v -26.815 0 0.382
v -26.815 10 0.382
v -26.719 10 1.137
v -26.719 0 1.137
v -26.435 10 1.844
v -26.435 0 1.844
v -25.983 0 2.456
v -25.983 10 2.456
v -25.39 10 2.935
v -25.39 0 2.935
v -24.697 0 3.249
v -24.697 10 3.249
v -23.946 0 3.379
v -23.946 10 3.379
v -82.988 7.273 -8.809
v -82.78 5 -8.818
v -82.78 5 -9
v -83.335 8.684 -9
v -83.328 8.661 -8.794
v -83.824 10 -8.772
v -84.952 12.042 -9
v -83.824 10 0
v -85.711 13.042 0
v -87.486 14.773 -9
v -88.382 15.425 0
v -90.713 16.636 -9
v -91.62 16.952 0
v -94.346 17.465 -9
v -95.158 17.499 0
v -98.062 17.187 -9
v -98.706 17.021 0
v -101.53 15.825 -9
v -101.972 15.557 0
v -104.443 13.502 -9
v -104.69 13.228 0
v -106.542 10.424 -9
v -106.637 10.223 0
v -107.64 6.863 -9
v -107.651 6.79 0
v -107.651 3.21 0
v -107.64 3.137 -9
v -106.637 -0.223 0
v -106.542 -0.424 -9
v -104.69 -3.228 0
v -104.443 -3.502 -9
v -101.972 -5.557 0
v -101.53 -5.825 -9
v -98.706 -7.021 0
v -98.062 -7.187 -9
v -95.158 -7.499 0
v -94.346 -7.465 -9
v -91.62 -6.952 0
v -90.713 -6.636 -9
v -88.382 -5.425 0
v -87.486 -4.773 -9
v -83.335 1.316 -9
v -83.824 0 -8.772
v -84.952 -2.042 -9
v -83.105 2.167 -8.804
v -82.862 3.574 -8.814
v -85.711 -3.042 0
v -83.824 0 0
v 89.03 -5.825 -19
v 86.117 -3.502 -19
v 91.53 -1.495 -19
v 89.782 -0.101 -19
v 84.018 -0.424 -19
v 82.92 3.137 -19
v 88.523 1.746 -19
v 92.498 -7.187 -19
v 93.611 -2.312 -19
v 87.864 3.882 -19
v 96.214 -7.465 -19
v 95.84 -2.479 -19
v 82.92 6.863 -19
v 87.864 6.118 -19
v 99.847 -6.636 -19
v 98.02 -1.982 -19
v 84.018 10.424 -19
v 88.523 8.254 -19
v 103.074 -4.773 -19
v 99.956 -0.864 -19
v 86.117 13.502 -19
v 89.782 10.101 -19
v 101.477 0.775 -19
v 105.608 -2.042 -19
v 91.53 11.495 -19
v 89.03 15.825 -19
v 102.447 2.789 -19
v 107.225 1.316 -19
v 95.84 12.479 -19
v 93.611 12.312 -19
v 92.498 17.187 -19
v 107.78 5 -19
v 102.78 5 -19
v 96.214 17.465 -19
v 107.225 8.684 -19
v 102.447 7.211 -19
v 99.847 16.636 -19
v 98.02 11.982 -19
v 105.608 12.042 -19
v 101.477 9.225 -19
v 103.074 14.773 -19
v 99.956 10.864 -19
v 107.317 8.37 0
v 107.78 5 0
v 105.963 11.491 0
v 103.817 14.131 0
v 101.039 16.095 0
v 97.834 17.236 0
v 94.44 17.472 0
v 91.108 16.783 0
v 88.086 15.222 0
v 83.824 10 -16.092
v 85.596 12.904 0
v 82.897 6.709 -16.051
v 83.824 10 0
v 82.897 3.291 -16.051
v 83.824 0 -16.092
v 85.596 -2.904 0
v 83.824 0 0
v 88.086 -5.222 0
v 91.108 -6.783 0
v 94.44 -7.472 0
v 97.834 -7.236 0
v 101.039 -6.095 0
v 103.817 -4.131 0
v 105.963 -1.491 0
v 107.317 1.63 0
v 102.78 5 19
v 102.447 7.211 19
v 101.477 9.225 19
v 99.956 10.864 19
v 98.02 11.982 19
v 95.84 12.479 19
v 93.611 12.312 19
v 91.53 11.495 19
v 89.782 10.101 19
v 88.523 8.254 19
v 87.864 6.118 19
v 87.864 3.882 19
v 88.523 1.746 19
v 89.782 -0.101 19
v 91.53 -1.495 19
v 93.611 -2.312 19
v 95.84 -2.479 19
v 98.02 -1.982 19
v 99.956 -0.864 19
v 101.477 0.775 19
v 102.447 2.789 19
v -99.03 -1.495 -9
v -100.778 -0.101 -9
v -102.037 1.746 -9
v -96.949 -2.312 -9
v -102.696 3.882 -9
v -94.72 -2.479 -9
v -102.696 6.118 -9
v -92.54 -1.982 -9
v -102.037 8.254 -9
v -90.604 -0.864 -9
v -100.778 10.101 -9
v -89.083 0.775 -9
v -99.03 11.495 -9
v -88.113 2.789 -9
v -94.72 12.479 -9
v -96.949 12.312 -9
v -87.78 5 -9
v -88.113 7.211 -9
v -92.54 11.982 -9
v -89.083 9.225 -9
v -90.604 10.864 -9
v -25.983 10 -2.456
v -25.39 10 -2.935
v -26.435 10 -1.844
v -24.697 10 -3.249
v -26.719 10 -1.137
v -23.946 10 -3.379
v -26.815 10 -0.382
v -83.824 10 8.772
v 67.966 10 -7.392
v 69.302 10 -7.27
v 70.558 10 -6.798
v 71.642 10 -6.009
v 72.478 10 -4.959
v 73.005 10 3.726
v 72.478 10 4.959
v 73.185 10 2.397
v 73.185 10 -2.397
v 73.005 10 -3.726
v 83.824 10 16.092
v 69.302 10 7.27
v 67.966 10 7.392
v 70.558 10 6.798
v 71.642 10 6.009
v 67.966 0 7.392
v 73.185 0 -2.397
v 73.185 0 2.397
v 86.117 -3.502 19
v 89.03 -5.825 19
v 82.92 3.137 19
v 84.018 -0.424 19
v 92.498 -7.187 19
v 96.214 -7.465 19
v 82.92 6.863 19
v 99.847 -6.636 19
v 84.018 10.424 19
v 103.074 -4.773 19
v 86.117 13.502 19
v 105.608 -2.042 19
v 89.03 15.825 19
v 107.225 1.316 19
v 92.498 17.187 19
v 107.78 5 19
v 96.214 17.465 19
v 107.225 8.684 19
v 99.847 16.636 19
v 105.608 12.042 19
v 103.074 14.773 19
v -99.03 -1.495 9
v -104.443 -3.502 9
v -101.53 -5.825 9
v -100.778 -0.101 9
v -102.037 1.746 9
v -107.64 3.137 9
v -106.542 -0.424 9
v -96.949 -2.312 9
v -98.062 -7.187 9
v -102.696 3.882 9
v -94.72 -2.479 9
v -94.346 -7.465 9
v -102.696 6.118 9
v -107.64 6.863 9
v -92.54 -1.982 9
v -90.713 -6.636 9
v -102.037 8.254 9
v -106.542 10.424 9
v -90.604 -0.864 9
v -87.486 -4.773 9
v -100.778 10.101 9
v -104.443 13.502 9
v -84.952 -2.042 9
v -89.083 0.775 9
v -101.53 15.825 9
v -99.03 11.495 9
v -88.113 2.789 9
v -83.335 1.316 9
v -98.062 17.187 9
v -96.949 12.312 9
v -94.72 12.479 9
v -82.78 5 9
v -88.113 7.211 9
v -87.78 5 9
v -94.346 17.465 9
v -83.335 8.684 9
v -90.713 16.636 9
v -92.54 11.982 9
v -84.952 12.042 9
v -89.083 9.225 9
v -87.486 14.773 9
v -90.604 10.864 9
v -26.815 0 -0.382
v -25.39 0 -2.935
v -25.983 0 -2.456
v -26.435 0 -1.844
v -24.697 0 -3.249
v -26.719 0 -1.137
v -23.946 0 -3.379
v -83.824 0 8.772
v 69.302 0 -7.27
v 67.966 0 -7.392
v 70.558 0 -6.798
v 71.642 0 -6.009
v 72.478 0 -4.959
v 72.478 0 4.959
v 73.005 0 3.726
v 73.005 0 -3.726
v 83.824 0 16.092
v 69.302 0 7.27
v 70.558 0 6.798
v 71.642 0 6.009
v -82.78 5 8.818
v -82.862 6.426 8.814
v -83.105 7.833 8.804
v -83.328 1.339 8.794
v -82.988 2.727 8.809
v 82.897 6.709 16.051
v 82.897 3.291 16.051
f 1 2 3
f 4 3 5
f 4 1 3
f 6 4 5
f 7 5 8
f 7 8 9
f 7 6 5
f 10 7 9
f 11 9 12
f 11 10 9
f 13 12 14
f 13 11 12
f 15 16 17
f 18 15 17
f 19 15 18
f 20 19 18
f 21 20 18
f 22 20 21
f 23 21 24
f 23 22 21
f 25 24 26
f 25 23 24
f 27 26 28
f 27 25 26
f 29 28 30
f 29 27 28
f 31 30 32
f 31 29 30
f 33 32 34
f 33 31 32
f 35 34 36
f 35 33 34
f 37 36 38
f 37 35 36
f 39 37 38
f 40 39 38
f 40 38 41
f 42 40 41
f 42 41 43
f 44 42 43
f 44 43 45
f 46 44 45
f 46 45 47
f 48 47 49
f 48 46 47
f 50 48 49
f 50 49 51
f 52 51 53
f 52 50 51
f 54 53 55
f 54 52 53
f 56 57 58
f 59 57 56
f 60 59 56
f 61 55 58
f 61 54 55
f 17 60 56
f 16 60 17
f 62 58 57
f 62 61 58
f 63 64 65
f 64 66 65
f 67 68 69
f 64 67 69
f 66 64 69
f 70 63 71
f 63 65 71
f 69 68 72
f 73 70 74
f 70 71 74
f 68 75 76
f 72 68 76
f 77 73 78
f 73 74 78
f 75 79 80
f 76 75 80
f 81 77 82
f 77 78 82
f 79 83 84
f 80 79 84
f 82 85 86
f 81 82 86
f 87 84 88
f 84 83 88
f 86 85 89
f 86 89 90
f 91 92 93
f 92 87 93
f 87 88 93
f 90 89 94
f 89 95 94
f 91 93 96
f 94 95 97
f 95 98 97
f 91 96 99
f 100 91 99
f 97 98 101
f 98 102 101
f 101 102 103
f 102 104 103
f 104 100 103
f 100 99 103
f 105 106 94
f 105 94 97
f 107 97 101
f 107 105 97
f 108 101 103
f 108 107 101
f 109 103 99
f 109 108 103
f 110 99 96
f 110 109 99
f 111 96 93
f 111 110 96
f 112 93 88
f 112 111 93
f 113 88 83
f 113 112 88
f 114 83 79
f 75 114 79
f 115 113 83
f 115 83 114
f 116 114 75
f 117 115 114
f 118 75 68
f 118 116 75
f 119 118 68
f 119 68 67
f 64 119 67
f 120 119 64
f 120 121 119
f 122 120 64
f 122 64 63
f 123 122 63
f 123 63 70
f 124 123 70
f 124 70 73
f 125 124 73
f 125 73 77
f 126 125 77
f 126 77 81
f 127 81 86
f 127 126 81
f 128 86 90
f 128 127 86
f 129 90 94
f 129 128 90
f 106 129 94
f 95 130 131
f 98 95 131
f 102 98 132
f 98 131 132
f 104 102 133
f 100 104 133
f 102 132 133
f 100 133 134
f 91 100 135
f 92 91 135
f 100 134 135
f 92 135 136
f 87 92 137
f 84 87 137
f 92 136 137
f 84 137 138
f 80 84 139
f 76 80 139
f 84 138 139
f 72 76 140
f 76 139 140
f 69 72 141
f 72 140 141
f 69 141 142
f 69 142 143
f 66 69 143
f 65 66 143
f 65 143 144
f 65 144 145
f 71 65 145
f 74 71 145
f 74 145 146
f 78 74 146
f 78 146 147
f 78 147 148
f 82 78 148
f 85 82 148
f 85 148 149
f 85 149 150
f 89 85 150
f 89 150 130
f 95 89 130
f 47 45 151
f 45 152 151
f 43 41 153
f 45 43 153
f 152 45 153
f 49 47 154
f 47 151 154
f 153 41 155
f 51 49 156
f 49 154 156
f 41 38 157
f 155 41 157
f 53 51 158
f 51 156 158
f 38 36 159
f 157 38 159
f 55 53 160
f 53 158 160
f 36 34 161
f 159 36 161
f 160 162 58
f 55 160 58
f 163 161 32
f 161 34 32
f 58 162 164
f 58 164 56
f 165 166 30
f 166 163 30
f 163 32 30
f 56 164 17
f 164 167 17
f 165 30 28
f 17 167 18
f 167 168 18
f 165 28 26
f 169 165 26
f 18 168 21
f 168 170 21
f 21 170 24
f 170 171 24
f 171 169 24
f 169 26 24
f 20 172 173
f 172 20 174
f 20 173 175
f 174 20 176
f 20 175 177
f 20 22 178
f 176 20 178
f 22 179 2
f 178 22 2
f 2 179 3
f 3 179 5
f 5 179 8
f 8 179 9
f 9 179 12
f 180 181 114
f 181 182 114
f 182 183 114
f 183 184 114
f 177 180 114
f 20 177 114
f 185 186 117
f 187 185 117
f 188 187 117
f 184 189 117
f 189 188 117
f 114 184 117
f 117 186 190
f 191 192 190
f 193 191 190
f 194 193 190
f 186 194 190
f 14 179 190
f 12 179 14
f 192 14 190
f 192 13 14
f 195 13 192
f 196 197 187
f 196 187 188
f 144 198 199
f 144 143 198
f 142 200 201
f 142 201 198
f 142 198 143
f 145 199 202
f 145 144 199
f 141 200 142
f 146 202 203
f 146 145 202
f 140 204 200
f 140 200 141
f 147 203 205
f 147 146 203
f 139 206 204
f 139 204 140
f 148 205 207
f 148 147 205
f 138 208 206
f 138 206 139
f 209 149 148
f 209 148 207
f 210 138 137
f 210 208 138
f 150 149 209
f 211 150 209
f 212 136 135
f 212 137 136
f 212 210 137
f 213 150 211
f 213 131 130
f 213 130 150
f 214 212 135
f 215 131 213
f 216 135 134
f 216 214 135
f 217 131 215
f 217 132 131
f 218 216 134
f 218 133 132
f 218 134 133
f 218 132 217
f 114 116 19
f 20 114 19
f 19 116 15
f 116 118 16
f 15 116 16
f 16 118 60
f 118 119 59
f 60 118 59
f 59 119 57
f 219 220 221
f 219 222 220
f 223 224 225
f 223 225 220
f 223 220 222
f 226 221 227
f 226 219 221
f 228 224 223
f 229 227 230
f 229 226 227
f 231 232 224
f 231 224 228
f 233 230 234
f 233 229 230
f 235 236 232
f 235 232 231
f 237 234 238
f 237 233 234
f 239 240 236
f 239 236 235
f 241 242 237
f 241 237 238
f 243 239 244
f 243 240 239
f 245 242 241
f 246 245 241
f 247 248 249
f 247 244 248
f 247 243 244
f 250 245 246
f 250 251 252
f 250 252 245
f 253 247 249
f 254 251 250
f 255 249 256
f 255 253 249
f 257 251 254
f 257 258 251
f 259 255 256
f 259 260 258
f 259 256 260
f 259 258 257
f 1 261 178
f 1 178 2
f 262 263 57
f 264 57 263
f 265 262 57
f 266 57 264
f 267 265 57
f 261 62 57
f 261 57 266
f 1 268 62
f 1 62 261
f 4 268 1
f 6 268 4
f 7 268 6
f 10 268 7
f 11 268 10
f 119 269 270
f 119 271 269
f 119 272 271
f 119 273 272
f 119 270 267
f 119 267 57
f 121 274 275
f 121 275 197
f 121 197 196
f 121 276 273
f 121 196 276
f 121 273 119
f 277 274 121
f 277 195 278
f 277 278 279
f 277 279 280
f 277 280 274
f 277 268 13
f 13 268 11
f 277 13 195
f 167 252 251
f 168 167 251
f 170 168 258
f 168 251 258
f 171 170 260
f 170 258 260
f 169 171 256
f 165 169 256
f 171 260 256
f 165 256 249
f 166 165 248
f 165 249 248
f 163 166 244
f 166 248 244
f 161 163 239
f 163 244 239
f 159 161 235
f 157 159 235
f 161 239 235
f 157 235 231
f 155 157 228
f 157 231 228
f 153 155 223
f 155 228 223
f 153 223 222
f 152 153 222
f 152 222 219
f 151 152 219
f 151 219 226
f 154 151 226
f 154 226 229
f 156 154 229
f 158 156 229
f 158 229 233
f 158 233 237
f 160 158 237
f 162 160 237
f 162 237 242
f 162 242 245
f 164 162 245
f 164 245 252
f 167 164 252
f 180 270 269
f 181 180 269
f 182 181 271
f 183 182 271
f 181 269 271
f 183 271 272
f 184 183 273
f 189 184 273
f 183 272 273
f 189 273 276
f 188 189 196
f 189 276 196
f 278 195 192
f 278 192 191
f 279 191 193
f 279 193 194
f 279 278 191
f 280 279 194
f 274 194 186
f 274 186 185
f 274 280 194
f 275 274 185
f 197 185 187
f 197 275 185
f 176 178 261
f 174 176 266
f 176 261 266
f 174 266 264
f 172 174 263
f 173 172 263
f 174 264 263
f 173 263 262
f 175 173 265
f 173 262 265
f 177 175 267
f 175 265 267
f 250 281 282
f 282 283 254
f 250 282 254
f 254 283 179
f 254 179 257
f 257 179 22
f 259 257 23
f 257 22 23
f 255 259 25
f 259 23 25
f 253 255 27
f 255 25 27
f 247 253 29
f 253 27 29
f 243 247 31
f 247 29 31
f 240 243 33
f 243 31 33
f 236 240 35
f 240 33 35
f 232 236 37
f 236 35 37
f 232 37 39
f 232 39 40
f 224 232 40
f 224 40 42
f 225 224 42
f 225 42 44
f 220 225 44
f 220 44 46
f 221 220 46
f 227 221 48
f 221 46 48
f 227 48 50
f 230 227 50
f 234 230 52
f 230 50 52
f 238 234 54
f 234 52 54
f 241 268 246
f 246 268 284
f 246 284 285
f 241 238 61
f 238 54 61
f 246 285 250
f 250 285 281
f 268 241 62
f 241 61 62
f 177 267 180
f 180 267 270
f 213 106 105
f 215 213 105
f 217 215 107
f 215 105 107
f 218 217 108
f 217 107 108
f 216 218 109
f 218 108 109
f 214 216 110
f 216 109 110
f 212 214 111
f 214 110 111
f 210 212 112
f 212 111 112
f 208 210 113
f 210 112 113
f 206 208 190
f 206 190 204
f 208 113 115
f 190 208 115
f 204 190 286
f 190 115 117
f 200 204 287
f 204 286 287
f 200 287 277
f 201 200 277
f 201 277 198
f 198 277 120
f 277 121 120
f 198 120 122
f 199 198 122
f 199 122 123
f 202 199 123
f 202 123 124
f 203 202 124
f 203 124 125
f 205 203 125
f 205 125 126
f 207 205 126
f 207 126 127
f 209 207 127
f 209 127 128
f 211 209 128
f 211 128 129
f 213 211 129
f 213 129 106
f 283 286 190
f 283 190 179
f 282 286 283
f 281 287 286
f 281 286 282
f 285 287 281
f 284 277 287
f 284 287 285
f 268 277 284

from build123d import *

# Parameters (mm, degrees)
BOSS_EXTRUDE1_DEPTH      = 10
BOSS_EXTRUDE2_DEPTH      = 9
BOSS_EXTRUDE2_DEPTH_BACK = 9
SKETCH2_R                = 12.5
SKETCH3_R                = 7.5
CUT_EXTRUDE1_DEPTH       = 113.046768917
BOSS_EXTRUDE3_DEPTH      = 19
BOSS_EXTRUDE3_DEPTH_BACK = 19
SKETCH4_R                = 12.5
SKETCH5_R                = 7.5
CUT_EXTRUDE2_DEPTH       = 116.614784522


with BuildPart() as part:
    # Sketch1 → Boss-Extrude1 (new body)
    with BuildSketch(Plane(origin=(0, 0, 0), x_dir=(1, 0, 0), z_dir=(0, 1, 0))):
        with BuildLine():
            Line((84.78, 16.133643284), (-84.78, 8.730493804))
            Line((-84.78, 8.730493804), (-84.78, 0))
            Line((-84.78, 0), (-26.81549416, 0))
            Line((-26.81549416, 0), (-26.81549416, 0.381782076))
            ThreePointArc((-26.81549416, 0.381782076), (-25.982586046, 2.456321244), (-23.946352322, 3.378926741))
            Line((-23.946352322, 3.378926741), (67.966408903, 7.391924561))
            ThreePointArc((67.966408903, 7.391924561), (71.642071119, 6.008503264), (73.18450584, 2.396683453))
            Line((73.18450584, 2.396683453), (73.18450584, 0))
            Line((73.18450584, 0), (84.78, 0))
            Line((84.78, 0), (84.78, 16.133643284))
        make_face()
    boss_extrude1 = extrude(amount=BOSS_EXTRUDE1_DEPTH)

    # Mirror1: Boss-Extrude1 across plane
    add(boss_extrude1.mirror(Plane.XY))

    # Sketch2 → Boss-Extrude2 (add, two sides: drawn at the far end of the back side and taken through both)
    with BuildSketch(Plane.XY.offset(-BOSS_EXTRUDE2_DEPTH_BACK)):
        with Locations((-95.28, 5)):
            Circle(SKETCH2_R)
    extrude(amount=BOSS_EXTRUDE2_DEPTH + BOSS_EXTRUDE2_DEPTH_BACK)

    # Sketch3 → Cut-Extrude1 (cut, through all)
    with BuildSketch(Plane.XY.offset(9)):
        with Locations((-95.28, 5)):
            Circle(SKETCH3_R)
    extrude(amount=-CUT_EXTRUDE1_DEPTH, mode=Mode.SUBTRACT)

    # Sketch4 → Boss-Extrude3 (add, two sides: drawn at the far end of the back side and taken through both)
    with BuildSketch(Plane.XY.offset(-BOSS_EXTRUDE3_DEPTH_BACK)):
        with Locations((95.28, 5)):
            Circle(SKETCH4_R)
    extrude(amount=BOSS_EXTRUDE3_DEPTH + BOSS_EXTRUDE3_DEPTH_BACK)

    # Sketch5 → Cut-Extrude2 (cut, through all)
    with BuildSketch(Plane.XY.offset(19)):
        with Locations((95.28, 5)):
            Circle(SKETCH5_R)
    extrude(amount=-CUT_EXTRUDE2_DEPTH, mode=Mode.SUBTRACT)


solid = part.part
